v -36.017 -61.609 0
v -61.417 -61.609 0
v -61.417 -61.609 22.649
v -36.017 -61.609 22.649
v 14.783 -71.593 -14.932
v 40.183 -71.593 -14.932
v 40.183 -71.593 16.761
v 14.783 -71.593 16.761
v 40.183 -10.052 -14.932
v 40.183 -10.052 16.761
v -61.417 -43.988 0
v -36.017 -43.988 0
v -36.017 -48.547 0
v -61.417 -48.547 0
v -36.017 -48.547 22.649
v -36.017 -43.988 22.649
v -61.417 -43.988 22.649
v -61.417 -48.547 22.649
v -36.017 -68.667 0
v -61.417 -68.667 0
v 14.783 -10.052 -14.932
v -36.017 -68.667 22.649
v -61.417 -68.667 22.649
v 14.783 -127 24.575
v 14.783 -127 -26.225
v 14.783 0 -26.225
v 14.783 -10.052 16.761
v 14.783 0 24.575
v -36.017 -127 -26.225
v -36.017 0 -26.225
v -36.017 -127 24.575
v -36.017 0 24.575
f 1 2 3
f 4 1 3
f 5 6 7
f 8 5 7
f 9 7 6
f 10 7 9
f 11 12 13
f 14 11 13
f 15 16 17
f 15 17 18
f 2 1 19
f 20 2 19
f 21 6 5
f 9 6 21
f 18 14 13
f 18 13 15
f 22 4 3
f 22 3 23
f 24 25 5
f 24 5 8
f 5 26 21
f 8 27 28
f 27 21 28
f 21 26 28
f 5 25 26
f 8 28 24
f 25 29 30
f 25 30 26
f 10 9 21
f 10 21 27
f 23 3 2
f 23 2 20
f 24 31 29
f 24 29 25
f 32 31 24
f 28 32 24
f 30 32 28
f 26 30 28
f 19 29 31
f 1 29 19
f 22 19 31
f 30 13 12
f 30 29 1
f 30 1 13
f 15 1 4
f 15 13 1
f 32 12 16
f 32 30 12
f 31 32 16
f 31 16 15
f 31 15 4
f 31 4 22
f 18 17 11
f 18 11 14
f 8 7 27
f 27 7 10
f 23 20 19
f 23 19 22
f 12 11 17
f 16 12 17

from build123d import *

# Parameters (mm, degrees)
F0_W     = 50.8
F0_H     = 50.8
F1_DEPTH = 127
F2_W     = 61.540618
F2_H     = 31.693089
F3_DEPTH = 25.4
F4_W     = 4.559308
F4_H     = 22.648551
F5_DEPTH = 25.4
F4_W_2   = 7.057599
F6_DEPTH = 25.4


with BuildPart() as f1:
    # F0 (on Front) → F1 (new body)
    with BuildSketch(Plane.XZ):
        with Locations((-10.617148, -0.824959)):
            Rectangle(F0_W, F0_H)
    extrude(amount=F1_DEPTH)

    # F2 (on face) → F3 (join, symmetric)
    with BuildSketch(Plane.YZ.offset(14.782852)):
        with Locations((-40.822573, 0.91443)):
            Rectangle(F2_W, F2_H)
    extrude(amount=F3_DEPTH, both=True)

    # F4 (on face) → F5 (join)
    with BuildSketch(Plane(origin=(-36.017148, 0, 0), x_dir=(0, -1, 0), z_dir=(-1, 0, 0))):
        with Locations((46.267241, 11.324275)):
            Rectangle(F4_W, F4_H)
    extrude(amount=F5_DEPTH)

    # F4 (on face) → F6 (join)
    with BuildSketch(Plane(origin=(-36.017148, 0, 0), x_dir=(0, -1, 0), z_dir=(-1, 0, 0))):
        with Locations((65.138158, 11.324275)):
            Rectangle(F4_W_2, F4_H)
    extrude(amount=F6_DEPTH)


solid = f1.part
